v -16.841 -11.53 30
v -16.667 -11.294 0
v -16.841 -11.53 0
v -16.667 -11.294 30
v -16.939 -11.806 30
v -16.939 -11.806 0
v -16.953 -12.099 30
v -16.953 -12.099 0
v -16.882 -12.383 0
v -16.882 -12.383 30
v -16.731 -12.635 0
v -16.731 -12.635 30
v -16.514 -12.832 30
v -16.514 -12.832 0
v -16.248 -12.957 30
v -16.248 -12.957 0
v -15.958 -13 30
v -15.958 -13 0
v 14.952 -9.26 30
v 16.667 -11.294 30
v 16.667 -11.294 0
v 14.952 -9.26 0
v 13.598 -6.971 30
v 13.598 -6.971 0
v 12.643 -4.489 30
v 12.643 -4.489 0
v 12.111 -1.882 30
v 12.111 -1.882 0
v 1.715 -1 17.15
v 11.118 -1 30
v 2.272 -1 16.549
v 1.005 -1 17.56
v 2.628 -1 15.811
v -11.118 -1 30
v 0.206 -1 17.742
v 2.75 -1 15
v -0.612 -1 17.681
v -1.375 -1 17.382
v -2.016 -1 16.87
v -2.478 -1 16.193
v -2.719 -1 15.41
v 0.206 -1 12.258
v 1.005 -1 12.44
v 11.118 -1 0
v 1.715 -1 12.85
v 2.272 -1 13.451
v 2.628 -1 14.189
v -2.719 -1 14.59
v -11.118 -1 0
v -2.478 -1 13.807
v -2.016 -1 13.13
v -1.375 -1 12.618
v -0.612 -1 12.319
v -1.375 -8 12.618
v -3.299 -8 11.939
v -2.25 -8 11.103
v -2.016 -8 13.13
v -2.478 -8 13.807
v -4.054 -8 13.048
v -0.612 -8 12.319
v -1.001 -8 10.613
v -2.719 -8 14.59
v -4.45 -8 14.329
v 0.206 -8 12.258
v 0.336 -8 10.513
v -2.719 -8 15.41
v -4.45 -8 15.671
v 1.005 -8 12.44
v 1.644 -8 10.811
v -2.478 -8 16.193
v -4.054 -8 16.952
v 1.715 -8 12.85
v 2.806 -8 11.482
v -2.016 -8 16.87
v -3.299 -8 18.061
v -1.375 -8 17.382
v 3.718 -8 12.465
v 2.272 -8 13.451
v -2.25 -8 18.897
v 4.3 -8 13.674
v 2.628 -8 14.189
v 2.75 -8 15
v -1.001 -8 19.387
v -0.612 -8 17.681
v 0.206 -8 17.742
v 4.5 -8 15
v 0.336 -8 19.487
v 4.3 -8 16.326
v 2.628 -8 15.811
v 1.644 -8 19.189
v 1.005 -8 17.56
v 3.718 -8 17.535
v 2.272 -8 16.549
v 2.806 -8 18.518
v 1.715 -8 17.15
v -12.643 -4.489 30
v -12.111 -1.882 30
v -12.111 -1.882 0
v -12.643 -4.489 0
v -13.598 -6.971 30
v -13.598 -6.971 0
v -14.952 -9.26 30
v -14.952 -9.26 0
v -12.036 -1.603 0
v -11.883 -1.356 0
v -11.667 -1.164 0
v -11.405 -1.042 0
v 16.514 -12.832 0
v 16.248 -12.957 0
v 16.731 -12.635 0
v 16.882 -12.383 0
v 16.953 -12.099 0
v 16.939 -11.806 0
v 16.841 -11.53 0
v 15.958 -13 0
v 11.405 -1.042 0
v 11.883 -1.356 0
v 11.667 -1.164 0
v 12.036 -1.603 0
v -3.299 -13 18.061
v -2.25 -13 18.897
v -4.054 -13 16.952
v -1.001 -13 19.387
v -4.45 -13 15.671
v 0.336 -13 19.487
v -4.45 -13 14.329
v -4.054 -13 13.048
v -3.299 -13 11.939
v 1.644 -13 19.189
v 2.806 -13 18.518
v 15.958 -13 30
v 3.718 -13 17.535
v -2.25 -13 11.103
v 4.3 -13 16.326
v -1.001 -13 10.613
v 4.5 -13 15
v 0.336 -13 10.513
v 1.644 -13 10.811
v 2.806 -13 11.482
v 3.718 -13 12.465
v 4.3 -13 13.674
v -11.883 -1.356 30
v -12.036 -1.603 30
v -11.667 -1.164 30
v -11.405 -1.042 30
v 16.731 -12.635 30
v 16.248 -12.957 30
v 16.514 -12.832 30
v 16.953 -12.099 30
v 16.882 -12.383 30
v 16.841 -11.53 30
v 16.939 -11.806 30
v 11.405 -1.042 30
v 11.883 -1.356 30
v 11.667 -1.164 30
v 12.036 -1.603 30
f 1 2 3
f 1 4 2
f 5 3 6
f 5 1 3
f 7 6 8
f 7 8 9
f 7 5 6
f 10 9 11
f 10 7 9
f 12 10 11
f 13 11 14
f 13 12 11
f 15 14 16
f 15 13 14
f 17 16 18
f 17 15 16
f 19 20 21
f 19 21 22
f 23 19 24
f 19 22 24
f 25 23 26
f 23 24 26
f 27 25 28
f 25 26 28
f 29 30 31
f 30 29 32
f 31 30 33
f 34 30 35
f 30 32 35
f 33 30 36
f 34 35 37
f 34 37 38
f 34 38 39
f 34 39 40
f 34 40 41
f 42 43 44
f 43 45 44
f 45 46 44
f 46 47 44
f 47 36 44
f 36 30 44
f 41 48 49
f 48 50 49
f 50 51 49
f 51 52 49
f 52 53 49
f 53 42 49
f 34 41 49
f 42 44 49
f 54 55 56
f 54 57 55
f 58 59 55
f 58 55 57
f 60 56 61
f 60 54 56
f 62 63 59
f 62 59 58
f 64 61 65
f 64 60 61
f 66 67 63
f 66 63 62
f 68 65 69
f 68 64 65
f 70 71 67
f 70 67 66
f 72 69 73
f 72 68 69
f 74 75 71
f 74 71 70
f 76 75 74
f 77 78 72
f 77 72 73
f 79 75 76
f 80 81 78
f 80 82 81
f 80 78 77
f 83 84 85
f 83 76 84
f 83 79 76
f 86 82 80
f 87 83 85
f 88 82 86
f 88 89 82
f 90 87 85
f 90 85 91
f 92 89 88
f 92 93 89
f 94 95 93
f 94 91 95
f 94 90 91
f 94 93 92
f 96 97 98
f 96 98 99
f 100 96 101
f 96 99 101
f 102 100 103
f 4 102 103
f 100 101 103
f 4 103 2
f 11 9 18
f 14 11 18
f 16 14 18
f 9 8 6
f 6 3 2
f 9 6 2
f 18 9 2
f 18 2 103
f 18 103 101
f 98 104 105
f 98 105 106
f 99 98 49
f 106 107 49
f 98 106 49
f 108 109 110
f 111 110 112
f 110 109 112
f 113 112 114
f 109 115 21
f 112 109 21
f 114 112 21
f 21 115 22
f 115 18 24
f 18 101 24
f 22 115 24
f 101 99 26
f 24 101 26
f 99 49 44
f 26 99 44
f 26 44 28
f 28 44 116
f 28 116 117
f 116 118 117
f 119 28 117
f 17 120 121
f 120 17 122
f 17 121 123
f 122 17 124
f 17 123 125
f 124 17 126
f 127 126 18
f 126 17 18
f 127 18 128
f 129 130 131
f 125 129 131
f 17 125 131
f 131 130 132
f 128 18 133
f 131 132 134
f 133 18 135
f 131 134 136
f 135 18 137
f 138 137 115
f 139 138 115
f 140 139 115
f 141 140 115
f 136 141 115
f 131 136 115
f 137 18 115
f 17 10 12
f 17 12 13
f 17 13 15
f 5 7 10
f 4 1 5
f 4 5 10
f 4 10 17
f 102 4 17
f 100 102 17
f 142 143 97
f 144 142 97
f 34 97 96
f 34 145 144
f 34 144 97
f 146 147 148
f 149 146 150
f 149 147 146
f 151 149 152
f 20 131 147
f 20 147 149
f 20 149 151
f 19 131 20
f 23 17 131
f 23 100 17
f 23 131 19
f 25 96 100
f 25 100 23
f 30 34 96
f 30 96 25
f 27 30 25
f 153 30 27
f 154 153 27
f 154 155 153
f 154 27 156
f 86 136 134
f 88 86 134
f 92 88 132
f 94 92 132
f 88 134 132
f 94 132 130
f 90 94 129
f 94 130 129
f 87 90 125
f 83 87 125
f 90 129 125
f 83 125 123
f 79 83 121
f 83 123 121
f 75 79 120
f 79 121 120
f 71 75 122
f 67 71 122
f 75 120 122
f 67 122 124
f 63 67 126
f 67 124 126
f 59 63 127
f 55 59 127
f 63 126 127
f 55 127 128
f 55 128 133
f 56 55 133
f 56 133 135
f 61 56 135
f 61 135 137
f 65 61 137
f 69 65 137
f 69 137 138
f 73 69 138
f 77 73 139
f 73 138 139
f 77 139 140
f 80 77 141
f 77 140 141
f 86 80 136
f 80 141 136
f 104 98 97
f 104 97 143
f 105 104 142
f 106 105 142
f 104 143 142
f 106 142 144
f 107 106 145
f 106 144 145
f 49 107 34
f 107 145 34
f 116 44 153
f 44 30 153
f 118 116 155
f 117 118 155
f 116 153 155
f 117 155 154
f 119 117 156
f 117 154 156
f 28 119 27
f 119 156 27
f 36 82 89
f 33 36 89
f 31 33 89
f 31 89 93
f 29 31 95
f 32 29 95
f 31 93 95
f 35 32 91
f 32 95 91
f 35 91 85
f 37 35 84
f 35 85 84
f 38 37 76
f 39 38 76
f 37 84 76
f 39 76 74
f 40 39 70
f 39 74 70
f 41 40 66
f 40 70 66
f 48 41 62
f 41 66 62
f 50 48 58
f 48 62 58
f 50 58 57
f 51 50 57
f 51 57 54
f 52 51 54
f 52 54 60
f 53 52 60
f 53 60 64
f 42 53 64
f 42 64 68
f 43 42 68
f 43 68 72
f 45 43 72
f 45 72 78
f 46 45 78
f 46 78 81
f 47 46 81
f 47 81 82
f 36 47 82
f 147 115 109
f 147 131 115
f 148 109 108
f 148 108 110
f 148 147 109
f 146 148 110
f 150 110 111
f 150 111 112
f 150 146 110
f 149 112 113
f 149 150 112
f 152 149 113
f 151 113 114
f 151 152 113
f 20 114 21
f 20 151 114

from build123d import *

# Parameters (mm, degrees)
F1_DEPTH  = 30
F2_R      = 4.5
F2_R_2    = 2.75
F3_DEPTH  = 5
F3_FACE_R = 2.75
F4_DEPTH  = 12
F5_R      = 1


with BuildPart() as f1:
    # F0 (on Top) → F1 (new body)
    with BuildSketch(Plane.XY):
        with BuildLine():
            ThreePointArc((-12.031281, -1), (-14.000959, -7.7477), (-18.672621, -13))
            Line((-18.672621, -13), (18.672621, -13))
            ThreePointArc((18.672621, -13), (14.000959, -7.7477), (12.031281, -1))
            Line((12.031281, -1), (-12.031281, -1))
        make_face()
    extrude(amount=F1_DEPTH)

    # F2 (on face) → F3 (cut)
    with BuildSketch(Plane.XZ.offset(13)):
        with Locations((0, 15)):
            Circle(F2_R)
        with Locations((0, 15)):
            Circle(F2_R_2, mode=Mode.SUBTRACT)
    extrude(amount=-F3_DEPTH, mode=Mode.SUBTRACT)

    # F3_face (on face) → F4 (cut, through all)
    with BuildSketch(Plane(origin=(0, -13, 15), x_dir=(1, 0, 0), z_dir=(0, -1, 0))):
        Circle(F3_FACE_R)
    extrude(amount=-F4_DEPTH, mode=Mode.SUBTRACT)

    # F5
    f5_edges = [f1.edges().sort_by_distance(p)[0] for p in [
        (-18.672621, -13, 15),
        (-12.031281, -1, 15),
        (18.672621, -13, 15),
        (12.031281, -1, 15),
    ]]
    fillet(f5_edges, radius=F5_R)


solid = f1.part
